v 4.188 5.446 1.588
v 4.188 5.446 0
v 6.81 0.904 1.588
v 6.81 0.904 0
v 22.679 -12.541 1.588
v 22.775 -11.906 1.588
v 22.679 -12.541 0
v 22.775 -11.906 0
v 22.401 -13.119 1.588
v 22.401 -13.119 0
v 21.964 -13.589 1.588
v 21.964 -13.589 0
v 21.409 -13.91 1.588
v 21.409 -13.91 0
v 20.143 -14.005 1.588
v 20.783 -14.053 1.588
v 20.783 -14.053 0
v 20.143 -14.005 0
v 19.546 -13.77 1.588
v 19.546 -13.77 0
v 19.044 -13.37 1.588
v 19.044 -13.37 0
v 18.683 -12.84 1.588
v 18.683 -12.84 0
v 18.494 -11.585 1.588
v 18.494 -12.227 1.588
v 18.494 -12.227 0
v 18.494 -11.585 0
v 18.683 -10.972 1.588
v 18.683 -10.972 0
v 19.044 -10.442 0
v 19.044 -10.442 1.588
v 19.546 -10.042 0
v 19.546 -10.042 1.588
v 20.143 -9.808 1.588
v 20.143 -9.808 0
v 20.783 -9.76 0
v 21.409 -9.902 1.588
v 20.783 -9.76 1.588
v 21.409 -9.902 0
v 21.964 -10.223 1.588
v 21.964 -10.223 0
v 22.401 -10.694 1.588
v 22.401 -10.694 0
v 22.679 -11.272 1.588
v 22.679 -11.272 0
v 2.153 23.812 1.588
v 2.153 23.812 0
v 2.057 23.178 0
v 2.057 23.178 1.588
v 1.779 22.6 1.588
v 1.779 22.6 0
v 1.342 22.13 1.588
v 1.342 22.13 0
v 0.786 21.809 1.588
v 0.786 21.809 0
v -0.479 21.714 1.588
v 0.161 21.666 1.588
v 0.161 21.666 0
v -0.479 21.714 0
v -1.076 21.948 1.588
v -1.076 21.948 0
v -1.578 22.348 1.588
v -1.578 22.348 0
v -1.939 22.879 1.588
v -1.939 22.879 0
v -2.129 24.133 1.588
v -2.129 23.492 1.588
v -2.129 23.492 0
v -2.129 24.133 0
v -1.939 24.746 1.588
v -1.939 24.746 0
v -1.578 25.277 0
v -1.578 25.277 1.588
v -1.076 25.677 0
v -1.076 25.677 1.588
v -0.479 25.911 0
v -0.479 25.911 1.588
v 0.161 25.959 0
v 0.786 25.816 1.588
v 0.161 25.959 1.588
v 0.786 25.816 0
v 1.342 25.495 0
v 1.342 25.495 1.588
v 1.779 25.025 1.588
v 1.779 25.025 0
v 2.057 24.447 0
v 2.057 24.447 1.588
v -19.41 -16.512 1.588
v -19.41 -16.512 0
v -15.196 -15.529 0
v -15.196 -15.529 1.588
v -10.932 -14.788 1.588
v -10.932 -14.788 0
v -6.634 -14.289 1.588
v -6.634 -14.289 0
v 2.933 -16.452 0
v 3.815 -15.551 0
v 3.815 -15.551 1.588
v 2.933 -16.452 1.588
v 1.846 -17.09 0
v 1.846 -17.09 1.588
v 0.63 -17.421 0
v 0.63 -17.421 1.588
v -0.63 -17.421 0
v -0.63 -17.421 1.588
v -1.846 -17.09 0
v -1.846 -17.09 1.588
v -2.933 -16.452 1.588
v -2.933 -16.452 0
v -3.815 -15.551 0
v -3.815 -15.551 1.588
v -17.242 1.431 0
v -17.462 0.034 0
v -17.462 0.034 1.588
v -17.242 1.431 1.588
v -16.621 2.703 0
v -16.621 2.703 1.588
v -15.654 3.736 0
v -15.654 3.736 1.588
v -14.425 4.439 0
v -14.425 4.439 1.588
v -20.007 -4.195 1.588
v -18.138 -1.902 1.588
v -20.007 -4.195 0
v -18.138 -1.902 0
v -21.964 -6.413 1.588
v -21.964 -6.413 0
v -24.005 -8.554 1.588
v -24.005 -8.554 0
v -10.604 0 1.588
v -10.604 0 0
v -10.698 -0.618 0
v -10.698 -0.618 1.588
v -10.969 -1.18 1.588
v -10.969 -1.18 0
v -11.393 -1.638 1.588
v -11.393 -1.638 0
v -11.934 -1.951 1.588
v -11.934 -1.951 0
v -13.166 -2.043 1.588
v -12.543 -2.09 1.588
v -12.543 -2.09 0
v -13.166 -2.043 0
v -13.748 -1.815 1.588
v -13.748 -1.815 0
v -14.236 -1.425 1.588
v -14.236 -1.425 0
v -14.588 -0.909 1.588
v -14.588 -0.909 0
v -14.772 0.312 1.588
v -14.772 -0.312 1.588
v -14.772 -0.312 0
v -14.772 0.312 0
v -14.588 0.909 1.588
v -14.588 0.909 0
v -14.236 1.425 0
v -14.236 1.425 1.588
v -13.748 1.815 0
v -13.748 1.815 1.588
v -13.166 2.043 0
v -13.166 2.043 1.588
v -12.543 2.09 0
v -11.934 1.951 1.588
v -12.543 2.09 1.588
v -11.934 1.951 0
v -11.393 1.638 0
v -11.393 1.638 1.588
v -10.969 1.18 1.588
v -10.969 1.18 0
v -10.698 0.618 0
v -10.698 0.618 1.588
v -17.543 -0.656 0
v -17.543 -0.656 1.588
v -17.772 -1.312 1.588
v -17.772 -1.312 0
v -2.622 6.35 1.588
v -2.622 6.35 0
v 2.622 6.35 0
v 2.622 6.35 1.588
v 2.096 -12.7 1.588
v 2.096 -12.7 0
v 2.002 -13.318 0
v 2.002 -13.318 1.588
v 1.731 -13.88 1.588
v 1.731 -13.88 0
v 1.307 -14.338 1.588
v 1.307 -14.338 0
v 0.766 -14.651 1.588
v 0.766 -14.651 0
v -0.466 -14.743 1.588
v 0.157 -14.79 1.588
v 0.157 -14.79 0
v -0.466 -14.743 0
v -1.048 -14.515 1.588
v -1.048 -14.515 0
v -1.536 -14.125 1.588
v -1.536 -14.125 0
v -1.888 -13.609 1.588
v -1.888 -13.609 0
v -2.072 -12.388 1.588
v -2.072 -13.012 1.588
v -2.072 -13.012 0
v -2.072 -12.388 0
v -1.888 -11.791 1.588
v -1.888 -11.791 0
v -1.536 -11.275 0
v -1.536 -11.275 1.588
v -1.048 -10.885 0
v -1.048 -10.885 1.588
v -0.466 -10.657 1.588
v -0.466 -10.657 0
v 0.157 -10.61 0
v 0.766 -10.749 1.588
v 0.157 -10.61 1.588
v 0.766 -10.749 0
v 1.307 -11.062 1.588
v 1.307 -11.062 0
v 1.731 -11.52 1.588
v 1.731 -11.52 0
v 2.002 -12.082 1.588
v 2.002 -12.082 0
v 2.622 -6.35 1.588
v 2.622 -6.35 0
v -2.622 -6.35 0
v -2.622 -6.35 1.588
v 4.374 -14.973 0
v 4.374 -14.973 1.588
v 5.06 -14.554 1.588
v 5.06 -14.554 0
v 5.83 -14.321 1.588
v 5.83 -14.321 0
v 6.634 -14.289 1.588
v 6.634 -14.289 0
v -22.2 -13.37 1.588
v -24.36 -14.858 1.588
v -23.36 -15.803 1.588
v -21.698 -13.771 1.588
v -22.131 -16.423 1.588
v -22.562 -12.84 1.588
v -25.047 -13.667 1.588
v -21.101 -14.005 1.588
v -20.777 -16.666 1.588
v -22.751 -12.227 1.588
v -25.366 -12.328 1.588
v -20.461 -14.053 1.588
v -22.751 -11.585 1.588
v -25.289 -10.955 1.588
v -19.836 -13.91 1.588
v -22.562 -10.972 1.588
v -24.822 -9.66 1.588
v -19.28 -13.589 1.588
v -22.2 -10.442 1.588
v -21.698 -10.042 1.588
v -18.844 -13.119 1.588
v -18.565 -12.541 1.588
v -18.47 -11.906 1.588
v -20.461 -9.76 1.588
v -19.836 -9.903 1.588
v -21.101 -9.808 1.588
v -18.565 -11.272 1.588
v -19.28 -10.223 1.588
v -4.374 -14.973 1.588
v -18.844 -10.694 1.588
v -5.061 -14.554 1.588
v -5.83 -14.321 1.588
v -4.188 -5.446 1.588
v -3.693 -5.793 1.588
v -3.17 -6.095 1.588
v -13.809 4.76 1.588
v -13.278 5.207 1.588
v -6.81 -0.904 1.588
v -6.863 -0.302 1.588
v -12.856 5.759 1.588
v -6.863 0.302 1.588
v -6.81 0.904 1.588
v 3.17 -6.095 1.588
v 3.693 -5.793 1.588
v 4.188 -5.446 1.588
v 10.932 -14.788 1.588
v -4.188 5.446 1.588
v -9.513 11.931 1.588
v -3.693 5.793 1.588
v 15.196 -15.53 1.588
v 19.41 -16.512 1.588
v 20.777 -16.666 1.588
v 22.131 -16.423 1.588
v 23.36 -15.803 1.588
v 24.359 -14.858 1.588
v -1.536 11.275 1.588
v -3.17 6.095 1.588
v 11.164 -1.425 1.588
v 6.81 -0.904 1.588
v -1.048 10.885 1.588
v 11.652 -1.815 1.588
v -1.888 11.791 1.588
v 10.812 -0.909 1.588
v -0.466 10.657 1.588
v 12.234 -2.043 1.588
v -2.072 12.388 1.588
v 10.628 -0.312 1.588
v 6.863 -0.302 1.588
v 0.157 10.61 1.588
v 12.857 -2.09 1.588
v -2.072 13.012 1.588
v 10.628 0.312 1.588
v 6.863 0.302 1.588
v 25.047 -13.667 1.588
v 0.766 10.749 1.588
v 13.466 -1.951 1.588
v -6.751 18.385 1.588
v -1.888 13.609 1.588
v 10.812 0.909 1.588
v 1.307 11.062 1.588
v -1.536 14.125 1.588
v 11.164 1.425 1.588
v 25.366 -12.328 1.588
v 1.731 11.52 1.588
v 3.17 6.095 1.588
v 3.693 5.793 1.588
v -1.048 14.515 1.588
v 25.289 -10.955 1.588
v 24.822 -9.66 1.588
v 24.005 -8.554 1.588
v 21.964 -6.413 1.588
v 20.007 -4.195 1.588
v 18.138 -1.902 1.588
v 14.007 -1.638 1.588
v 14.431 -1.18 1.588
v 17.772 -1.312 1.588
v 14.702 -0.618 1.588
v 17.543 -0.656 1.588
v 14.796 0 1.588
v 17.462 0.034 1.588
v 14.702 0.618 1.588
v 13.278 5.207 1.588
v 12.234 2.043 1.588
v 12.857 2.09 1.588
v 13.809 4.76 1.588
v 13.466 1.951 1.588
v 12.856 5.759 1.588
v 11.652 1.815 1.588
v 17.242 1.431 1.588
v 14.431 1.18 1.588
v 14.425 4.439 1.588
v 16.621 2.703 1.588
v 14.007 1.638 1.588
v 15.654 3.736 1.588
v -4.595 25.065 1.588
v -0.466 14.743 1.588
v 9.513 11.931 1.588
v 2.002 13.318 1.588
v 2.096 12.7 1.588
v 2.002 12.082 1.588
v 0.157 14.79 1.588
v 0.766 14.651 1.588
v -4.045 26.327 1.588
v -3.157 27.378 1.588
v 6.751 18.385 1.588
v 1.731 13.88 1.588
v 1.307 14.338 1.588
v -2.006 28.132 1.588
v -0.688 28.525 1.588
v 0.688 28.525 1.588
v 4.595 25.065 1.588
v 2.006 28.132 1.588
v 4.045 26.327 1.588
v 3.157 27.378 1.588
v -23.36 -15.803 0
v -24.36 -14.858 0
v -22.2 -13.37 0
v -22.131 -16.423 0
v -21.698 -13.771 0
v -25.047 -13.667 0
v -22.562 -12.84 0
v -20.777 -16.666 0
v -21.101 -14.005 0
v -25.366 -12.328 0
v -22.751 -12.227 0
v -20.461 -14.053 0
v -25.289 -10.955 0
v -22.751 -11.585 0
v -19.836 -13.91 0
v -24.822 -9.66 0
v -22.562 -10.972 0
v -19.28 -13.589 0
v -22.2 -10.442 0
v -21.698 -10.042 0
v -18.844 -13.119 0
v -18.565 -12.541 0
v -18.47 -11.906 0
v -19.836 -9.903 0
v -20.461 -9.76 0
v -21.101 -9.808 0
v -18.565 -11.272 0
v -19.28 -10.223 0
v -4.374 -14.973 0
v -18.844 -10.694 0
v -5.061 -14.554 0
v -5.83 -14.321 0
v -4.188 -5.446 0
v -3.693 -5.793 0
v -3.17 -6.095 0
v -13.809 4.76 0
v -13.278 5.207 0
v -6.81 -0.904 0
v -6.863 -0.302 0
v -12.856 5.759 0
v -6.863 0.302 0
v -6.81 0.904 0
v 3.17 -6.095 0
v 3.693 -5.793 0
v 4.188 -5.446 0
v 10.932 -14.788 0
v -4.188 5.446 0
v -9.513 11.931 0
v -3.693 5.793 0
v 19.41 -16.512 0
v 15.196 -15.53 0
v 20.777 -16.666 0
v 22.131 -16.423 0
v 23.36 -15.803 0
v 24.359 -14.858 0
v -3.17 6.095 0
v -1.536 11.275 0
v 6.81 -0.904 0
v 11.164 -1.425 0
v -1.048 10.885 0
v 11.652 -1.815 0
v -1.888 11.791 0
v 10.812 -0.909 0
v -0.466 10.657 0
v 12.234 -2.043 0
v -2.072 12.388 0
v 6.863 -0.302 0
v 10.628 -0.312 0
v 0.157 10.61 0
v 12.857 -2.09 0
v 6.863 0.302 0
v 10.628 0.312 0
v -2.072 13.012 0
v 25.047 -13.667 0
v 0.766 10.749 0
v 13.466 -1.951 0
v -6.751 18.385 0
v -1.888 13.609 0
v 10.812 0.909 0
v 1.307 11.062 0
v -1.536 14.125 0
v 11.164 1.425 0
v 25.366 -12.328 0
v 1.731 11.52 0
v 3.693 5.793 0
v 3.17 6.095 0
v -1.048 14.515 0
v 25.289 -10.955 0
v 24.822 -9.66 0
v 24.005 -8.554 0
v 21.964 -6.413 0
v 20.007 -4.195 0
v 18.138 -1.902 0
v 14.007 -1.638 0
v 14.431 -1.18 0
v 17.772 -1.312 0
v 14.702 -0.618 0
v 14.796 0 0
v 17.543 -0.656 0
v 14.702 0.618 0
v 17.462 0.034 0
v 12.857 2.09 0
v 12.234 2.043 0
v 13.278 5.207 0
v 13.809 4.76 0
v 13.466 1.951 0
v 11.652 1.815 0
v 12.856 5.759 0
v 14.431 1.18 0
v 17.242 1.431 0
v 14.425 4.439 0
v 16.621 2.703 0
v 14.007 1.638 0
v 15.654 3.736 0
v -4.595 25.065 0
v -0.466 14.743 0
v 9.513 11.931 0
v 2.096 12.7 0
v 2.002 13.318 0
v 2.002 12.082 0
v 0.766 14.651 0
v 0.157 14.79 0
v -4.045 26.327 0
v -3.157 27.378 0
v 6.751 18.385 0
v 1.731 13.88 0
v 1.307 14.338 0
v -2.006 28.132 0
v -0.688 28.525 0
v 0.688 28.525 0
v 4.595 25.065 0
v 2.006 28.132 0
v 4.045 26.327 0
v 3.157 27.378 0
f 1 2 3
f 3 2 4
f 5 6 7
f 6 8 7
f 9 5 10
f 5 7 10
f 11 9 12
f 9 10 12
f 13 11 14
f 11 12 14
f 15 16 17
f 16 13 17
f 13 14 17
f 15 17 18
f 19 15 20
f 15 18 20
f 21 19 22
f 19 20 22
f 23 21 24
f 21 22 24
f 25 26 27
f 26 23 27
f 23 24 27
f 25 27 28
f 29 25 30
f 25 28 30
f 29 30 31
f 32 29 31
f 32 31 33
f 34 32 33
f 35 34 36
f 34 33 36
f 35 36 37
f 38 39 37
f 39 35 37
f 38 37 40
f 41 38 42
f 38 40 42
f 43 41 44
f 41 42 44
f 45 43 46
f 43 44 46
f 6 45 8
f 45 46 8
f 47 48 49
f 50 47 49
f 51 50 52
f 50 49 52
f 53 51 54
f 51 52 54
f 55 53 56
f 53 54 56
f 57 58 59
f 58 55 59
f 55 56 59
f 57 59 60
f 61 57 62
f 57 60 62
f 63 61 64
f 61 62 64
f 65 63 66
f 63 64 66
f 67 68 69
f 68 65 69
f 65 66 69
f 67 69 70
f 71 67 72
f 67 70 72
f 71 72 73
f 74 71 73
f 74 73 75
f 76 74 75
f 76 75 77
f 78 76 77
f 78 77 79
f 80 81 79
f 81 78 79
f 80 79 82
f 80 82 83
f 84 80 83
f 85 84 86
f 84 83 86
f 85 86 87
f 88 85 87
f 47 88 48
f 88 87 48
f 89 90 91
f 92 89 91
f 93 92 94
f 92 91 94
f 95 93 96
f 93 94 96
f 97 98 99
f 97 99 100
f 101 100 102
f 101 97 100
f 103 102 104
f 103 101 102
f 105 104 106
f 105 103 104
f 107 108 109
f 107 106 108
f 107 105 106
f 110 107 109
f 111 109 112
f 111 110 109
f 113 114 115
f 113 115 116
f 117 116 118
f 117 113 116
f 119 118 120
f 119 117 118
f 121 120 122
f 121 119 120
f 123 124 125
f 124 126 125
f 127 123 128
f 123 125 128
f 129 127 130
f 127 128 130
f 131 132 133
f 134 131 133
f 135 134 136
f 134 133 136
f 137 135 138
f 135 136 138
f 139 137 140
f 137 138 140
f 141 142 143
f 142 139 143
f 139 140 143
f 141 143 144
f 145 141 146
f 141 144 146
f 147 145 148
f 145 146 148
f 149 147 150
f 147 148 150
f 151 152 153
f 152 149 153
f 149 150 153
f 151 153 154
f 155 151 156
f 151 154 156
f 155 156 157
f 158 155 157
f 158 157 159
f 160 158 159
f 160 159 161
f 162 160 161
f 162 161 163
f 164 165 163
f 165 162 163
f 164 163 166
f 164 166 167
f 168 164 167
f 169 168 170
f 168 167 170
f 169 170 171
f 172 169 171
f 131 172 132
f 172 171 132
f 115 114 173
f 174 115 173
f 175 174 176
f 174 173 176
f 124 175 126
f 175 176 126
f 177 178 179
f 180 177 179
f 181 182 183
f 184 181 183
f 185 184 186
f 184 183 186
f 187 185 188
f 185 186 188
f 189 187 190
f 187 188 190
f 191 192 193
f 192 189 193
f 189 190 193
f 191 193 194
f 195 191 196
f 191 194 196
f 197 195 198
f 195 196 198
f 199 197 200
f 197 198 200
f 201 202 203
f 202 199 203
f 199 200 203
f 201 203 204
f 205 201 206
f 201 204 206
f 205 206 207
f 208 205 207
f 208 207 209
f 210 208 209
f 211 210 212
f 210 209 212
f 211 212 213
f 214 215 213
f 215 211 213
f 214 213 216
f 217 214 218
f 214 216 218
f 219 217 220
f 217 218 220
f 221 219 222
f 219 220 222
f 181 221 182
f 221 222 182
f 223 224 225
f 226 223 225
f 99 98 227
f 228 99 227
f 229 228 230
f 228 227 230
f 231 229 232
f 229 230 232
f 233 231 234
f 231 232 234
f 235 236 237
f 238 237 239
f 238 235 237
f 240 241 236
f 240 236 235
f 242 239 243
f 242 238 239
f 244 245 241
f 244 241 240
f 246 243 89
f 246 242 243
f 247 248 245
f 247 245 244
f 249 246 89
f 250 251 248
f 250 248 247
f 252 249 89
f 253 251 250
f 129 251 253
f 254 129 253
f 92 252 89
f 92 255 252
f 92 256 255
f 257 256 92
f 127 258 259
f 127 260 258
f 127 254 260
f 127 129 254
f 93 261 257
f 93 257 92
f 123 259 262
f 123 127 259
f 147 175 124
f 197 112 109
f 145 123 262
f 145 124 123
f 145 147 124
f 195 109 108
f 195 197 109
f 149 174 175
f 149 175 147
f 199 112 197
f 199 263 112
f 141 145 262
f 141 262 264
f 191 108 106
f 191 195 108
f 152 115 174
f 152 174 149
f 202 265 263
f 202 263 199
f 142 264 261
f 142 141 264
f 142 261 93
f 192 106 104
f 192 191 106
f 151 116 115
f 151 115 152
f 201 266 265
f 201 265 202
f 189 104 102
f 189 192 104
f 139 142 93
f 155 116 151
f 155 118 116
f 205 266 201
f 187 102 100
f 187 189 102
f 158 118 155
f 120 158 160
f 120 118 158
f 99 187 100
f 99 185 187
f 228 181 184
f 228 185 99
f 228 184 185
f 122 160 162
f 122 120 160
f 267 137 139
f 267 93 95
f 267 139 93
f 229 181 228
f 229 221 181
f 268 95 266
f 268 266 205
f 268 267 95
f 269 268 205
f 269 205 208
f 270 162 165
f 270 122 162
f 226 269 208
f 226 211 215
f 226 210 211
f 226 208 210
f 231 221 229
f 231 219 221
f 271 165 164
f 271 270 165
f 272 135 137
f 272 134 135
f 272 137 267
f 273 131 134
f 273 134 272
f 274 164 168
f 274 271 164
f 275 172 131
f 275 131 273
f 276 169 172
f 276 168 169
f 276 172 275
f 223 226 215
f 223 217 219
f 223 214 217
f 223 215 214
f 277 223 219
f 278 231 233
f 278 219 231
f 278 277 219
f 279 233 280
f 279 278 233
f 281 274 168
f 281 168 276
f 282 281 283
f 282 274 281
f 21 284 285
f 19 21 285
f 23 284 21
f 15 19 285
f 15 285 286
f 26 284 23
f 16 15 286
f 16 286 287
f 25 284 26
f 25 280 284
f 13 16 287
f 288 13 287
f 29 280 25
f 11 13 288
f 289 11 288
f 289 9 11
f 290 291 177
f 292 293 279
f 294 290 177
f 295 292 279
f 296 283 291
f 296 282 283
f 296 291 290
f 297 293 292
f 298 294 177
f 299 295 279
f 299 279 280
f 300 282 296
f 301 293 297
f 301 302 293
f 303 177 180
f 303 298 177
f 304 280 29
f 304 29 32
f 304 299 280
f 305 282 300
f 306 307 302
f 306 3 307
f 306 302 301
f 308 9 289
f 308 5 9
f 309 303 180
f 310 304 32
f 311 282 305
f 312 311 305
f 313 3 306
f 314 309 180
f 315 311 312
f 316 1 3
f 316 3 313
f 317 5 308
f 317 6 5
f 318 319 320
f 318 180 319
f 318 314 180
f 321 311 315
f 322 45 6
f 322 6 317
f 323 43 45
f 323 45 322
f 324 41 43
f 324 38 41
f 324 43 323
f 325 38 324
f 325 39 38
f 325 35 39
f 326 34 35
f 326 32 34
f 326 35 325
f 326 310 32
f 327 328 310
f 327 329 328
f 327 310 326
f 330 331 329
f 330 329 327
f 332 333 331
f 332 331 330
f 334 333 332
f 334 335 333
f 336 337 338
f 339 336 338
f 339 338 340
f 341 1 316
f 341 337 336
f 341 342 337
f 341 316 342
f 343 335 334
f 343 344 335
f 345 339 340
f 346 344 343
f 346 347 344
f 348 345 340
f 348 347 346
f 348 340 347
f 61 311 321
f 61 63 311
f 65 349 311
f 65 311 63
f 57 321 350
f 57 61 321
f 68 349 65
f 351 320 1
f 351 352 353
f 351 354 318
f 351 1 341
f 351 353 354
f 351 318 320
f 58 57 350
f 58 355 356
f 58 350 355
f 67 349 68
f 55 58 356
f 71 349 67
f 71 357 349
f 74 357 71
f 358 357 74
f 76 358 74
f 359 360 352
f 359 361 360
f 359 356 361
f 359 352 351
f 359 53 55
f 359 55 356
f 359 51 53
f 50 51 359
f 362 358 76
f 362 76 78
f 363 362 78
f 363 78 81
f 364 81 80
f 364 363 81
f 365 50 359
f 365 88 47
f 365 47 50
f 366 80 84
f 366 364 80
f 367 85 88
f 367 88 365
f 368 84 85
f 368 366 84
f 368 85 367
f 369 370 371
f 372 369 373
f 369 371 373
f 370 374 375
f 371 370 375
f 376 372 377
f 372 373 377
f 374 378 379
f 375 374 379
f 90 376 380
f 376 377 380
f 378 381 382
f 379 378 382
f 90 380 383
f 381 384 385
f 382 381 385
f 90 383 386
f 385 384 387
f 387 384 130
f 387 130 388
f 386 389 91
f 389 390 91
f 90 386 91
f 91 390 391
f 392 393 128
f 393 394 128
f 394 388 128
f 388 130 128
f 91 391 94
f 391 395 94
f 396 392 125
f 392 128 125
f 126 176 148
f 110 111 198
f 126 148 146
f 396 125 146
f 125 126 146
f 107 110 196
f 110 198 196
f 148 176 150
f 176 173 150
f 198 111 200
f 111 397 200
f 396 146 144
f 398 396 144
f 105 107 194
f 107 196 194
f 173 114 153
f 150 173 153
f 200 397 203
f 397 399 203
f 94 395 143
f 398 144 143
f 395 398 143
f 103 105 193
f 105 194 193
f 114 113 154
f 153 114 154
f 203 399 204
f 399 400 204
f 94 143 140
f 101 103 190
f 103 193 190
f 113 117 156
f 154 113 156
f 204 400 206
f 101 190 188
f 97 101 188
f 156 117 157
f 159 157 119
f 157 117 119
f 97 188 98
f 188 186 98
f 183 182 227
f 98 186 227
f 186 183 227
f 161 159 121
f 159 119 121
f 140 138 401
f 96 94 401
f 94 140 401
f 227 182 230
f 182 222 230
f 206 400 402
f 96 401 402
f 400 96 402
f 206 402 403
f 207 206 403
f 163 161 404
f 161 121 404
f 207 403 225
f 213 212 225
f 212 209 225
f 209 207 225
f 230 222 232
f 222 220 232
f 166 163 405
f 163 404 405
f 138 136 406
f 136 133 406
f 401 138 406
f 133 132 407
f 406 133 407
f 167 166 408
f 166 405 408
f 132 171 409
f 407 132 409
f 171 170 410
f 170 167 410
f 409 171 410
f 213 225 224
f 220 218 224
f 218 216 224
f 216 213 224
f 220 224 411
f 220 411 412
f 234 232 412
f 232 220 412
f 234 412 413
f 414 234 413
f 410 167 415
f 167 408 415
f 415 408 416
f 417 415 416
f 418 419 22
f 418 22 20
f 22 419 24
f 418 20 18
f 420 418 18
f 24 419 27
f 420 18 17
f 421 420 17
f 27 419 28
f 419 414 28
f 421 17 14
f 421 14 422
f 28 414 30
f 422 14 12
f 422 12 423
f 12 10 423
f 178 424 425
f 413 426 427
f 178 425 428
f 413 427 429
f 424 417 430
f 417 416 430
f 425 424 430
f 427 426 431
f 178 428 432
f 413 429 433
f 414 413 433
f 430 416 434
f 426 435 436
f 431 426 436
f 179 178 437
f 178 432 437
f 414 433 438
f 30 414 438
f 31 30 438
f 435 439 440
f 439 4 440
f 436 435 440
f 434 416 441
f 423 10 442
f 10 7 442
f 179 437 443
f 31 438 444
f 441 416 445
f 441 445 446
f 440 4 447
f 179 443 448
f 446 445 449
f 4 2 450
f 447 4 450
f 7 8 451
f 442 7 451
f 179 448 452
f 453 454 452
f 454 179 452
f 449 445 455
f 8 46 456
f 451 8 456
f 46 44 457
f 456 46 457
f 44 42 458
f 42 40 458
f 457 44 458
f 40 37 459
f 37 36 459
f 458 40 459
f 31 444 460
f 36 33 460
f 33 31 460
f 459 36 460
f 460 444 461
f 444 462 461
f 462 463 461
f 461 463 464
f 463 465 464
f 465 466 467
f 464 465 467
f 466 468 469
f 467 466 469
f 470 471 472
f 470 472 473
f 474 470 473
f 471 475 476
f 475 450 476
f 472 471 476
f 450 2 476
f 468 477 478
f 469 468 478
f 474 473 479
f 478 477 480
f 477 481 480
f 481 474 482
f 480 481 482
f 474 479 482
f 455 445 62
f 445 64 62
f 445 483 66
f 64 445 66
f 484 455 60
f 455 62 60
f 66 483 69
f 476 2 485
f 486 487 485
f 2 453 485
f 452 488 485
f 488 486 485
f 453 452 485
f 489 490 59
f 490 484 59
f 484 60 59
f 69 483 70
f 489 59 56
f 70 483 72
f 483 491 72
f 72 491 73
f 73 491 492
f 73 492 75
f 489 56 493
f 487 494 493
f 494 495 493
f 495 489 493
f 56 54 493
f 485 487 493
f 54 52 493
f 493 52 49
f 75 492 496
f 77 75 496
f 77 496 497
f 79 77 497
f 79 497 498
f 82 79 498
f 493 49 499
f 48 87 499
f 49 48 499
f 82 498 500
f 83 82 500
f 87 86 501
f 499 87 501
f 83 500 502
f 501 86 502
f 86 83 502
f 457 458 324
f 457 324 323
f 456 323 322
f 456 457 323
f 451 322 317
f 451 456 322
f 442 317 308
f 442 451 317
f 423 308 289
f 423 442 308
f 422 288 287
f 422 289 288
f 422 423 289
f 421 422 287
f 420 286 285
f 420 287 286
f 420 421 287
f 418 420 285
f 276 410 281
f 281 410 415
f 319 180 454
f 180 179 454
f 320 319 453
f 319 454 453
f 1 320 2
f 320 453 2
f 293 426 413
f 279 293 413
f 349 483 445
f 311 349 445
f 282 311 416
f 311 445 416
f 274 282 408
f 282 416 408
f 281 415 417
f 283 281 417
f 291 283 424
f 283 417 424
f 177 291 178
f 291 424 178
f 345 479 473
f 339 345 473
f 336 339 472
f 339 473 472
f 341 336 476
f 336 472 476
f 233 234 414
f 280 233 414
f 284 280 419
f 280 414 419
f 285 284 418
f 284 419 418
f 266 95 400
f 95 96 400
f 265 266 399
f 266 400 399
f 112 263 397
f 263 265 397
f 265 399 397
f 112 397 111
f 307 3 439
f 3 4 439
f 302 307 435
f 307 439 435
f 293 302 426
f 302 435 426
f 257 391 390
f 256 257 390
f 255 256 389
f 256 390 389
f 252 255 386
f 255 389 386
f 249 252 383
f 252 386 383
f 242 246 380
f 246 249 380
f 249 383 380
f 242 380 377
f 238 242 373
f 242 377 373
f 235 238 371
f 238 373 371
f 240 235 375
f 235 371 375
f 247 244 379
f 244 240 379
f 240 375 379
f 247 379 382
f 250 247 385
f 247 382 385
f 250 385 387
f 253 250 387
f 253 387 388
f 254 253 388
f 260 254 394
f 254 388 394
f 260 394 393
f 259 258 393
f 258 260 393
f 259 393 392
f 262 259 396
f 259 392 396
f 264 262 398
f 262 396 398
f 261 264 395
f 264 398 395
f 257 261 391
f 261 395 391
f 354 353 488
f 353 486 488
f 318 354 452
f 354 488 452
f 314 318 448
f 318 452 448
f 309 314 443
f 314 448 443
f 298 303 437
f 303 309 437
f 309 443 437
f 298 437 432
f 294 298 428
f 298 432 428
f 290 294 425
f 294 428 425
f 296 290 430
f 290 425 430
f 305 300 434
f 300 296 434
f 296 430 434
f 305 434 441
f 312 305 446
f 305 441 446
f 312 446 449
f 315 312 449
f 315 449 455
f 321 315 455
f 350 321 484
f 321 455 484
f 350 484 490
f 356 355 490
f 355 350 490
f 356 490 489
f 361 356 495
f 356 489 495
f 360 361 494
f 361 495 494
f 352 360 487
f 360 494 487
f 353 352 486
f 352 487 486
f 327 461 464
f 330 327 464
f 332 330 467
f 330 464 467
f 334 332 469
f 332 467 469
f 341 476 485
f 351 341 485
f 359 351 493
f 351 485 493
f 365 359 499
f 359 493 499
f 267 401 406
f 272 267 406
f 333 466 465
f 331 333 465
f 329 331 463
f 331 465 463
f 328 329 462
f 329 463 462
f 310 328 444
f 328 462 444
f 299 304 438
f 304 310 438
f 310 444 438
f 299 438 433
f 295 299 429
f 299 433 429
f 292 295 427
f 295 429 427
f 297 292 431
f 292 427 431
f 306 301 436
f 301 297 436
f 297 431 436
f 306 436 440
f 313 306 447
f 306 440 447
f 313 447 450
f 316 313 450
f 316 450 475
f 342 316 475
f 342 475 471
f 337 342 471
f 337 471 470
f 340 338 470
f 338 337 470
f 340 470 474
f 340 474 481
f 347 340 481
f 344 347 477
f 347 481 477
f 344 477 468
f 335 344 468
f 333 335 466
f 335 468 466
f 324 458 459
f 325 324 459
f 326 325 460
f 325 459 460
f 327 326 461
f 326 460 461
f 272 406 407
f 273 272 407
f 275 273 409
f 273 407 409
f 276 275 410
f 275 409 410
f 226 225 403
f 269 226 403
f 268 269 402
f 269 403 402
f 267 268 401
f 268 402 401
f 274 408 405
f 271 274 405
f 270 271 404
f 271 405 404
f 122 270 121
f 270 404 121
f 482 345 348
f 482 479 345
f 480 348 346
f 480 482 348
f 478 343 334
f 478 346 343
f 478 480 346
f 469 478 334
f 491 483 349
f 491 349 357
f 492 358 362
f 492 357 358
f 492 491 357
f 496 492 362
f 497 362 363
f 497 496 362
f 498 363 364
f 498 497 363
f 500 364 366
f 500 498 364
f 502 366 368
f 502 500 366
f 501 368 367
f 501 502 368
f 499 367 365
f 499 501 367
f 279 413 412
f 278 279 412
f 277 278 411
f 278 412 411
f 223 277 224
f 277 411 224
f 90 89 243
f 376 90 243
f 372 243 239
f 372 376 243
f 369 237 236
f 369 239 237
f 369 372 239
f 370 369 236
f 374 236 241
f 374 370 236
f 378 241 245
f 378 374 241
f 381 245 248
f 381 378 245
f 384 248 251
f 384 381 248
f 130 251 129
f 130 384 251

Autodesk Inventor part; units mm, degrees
ref_plane "YZ Plane" through (0, 0, 0) normal (1, 0, 0) x (0, 1, 0)
ref_plane "XZ Plane" through (0, 0, 0) normal (0, 1, 0) x (-1, 0, 0)
ref_plane "XY Plane" through (0, 0, 0) normal (0, 0, 1) x (1, 0, 0)
sketch "VersaHex Adapter Hole" plane through (0, 0, 0) normal (0, 0, 1) x (1, 0, 0)
  line L0 (-2.6931, -2.4859) -> (-0.0712, 2.0554)
  arc A0 (1.4952, 2.9597) -> (-0.0712, 2.0554) centre (4.1171, -3.3903) ccw
  line L1 (1.4952, 2.9597) -> (6.7391, 2.9597)
  arc A1 (8.3055, 2.0554) -> (6.7391, 2.9597) centre (4.1171, -3.3903) ccw
  line L2 (8.3055, 2.0554) -> (10.9274, -2.4859)
  arc A2 (10.9274, -4.2946) -> (10.9274, -2.4859) centre (4.1171, -3.3903) ccw
  line L3 (10.9274, -4.2946) -> (8.3055, -8.8359)
  arc A3 (6.7391, -9.7403) -> (8.3055, -8.8359) centre (4.1171, -3.3903) ccw
  line L4 (6.7391, -9.7403) -> (1.4952, -9.7403)
  arc A4 (-0.0712, -8.8359) -> (1.4952, -9.7403) centre (4.1171, -3.3903) ccw
  line L5 (-0.0712, -8.8359) -> (-2.6931, -4.2946)
  arc A5 (-2.6931, -2.4859) -> (-2.6931, -4.2946) centre (4.1171, -3.3903) ccw
  point P0 (3.8427, -3.1642)
  point P1 (0, 3.175)
  point P2 (0, -3.175)
  point P3 (0, 0)
sketch "Block2" plane through (0, 0, 0) normal (0, 0, 1) x (1, 0, 0)
  line L0 (30.4112, -18.6542) -> (33.0331, -14.1129)
  arc A0 (34.5995, -13.2085) -> (33.0331, -14.1129) centre (37.2214, -19.5585) ccw
  line L1 (34.5995, -13.2085) -> (39.8433, -13.2085)
  arc A1 (41.4097, -14.1129) -> (39.8433, -13.2085) centre (37.2214, -19.5585) ccw
  line L2 (41.4097, -14.1129) -> (44.0316, -18.6542)
  arc A2 (44.0316, -20.4629) -> (44.0316, -18.6542) centre (37.2214, -19.5585) ccw
  line L3 (44.0316, -20.4629) -> (41.4097, -25.0042)
  arc A3 (39.8433, -25.9085) -> (41.4097, -25.0042) centre (37.2214, -19.5585) ccw
  line L4 (39.8433, -25.9085) -> (34.5995, -25.9085)
  arc A4 (33.0331, -25.0042) -> (34.5995, -25.9085) centre (37.2214, -19.5585) ccw
  line L5 (33.0331, -25.0042) -> (30.4112, -20.4629)
  arc A5 (30.4112, -18.6542) -> (30.4112, -20.4629) centre (37.2214, -19.5585) ccw
  point P0 (37.2214, -19.5585)
sketch "Sketch1" plane through (0, 0, 0) normal (0, 0, 1) x (1, 0, 0)
  circle A0 centre (-20.6222, -11.9063) radius 2.1526
  circle A1 centre (20.6222, -11.9062) radius 2.1526
  circle A2 centre (0, 23.8125) radius 2.1526
  arc A3 (-24.0046, -8.5535) -> (-19.4099, -16.5119) centre (-20.6222, -11.9063) ccw
  arc A4 (19.4099, -16.5119) -> (24.0046, -8.5535) centre (20.6222, -11.9062) ccw
  arc A5 (4.5947, 25.0654) -> (-4.5947, 25.0654) centre (0, 23.8125) ccw
  arc A6 (-3.8147, -15.5513) -> (3.8147, -15.5513) centre (0, -12.7) ccw
  arc A7 (19.4099, -16.5119) -> (6.634, -14.2891) centre (0, -90.2489) ccw
  arc A8 (-6.634, -14.2891) -> (-19.4099, -16.5119) centre (0, -90.2489) ccw
  arc A9 (-3.8147, -15.5513) -> (-6.634, -14.2891) centre (-6.3578, -17.4521) ccw
  arc A10 (6.634, -14.2891) -> (3.8147, -15.5513) centre (6.3578, -17.4521) ccw
  circle A11 centre (0, -12.7) radius 2.0955
  circle A12 centre (0, 12.7) radius 2.0955
  circle A13 centre (-12.7, 0) radius 2.0955
  circle A14 centre (12.7, 0) radius 2.0955
  arc A15 (-14.4254, 4.439) -> (-17.4624, 0.0335) centre (-12.7, 0) ccw
  arc A16 (17.4624, 0.0335) -> (14.4254, 4.439) centre (12.7, 0) ccw
  arc A17 (-24.0046, -8.5535) -> (-18.1381, -1.9024) centre (-78.1579, 45.1245) ccw
  arc A18 (-12.8565, 5.7591) -> (-4.5947, 25.0654) centre (-78.1579, 45.1245) ccw
  arc A19 (4.5947, 25.0654) -> (12.8565, 5.7591) centre (78.1579, 45.1245) ccw
  arc A20 (18.1381, -1.9024) -> (24.0046, -8.5535) centre (78.1579, 45.1245) ccw
  arc A21 (-18.1381, -1.9024) -> (-17.4624, 0.0335) centre (-20.6373, 0.0558) ccw
  arc A22 (-14.4254, 4.439) -> (-12.8565, 5.7591) centre (-15.5756, 7.3983) ccw
  arc A23 (12.8565, 5.7591) -> (14.4254, 4.439) centre (15.5756, 7.3983) ccw
  arc A24 (17.4624, 0.0335) -> (18.1381, -1.9024) centre (20.6373, 0.0558) ccw
  line L0 (-6.8102, 0.9044) -> (-4.1883, 5.4456)
  arc A25 (-2.6219, 6.35) -> (-4.1883, 5.4456) centre (0, 0) ccw
  line L1 (-2.6219, 6.35) -> (2.6219, 6.35)
  arc A26 (4.1883, 5.4456) -> (2.6219, 6.35) centre (0, 0) ccw
  line L2 (4.1883, 5.4456) -> (6.8102, 0.9044)
  arc A27 (6.8102, -0.9044) -> (6.8102, 0.9044) centre (0, 0) ccw
  line L3 (6.8102, -0.9044) -> (4.1883, -5.4456)
  arc A28 (2.6219, -6.35) -> (4.1883, -5.4456) centre (0, 0) ccw
  line L4 (2.6219, -6.35) -> (-2.6219, -6.35)
  arc A29 (-4.1883, -5.4456) -> (-2.6219, -6.35) centre (0, 0) ccw
  line L5 (-4.1883, -5.4456) -> (-6.8102, -0.9044)
  arc A30 (-6.8102, 0.9044) -> (-6.8102, -0.9044) centre (0, 0) ccw
  dimension "d5" = 9.525
  dimension "d6" = 9.525
  dimension "d7" = 9.525
  dimension "d8" = 9.525
  dimension "d9" = 3.175
  dimension "d10" = 4.191
  dimension "d11" = 4.191
  dimension "d12" = 4.191
  dimension "d13" = 4.191
  dimension "d14" = 9.525
  dimension "d15" = 9.525
  dimension "d16" = 3.175
extrude "Extrusion1" add sketch "Sketch1" along normal blind 1.5875
equation "\"BendRadius\" = Thickness"
equation "\"BendReliefWidth\" = Thickness"
equation "\"BendReliefDepth\" = 0.5 * Thickness"
equation "\"CornerReliefSize\" = 4 * Thickness"
equation "\"MinimumRemnant\" = 2 * Thickness"
equation "\"TransitionRadius\" = BendRadius"
equation "\"JacobiRadiusSize\" = BendRadius"
equation "\"GapSize\" = Thickness"
equation "\"Thickness\" = 1.5875"
properties part number "drop_center_hub" material "Acetal Resin, White"
